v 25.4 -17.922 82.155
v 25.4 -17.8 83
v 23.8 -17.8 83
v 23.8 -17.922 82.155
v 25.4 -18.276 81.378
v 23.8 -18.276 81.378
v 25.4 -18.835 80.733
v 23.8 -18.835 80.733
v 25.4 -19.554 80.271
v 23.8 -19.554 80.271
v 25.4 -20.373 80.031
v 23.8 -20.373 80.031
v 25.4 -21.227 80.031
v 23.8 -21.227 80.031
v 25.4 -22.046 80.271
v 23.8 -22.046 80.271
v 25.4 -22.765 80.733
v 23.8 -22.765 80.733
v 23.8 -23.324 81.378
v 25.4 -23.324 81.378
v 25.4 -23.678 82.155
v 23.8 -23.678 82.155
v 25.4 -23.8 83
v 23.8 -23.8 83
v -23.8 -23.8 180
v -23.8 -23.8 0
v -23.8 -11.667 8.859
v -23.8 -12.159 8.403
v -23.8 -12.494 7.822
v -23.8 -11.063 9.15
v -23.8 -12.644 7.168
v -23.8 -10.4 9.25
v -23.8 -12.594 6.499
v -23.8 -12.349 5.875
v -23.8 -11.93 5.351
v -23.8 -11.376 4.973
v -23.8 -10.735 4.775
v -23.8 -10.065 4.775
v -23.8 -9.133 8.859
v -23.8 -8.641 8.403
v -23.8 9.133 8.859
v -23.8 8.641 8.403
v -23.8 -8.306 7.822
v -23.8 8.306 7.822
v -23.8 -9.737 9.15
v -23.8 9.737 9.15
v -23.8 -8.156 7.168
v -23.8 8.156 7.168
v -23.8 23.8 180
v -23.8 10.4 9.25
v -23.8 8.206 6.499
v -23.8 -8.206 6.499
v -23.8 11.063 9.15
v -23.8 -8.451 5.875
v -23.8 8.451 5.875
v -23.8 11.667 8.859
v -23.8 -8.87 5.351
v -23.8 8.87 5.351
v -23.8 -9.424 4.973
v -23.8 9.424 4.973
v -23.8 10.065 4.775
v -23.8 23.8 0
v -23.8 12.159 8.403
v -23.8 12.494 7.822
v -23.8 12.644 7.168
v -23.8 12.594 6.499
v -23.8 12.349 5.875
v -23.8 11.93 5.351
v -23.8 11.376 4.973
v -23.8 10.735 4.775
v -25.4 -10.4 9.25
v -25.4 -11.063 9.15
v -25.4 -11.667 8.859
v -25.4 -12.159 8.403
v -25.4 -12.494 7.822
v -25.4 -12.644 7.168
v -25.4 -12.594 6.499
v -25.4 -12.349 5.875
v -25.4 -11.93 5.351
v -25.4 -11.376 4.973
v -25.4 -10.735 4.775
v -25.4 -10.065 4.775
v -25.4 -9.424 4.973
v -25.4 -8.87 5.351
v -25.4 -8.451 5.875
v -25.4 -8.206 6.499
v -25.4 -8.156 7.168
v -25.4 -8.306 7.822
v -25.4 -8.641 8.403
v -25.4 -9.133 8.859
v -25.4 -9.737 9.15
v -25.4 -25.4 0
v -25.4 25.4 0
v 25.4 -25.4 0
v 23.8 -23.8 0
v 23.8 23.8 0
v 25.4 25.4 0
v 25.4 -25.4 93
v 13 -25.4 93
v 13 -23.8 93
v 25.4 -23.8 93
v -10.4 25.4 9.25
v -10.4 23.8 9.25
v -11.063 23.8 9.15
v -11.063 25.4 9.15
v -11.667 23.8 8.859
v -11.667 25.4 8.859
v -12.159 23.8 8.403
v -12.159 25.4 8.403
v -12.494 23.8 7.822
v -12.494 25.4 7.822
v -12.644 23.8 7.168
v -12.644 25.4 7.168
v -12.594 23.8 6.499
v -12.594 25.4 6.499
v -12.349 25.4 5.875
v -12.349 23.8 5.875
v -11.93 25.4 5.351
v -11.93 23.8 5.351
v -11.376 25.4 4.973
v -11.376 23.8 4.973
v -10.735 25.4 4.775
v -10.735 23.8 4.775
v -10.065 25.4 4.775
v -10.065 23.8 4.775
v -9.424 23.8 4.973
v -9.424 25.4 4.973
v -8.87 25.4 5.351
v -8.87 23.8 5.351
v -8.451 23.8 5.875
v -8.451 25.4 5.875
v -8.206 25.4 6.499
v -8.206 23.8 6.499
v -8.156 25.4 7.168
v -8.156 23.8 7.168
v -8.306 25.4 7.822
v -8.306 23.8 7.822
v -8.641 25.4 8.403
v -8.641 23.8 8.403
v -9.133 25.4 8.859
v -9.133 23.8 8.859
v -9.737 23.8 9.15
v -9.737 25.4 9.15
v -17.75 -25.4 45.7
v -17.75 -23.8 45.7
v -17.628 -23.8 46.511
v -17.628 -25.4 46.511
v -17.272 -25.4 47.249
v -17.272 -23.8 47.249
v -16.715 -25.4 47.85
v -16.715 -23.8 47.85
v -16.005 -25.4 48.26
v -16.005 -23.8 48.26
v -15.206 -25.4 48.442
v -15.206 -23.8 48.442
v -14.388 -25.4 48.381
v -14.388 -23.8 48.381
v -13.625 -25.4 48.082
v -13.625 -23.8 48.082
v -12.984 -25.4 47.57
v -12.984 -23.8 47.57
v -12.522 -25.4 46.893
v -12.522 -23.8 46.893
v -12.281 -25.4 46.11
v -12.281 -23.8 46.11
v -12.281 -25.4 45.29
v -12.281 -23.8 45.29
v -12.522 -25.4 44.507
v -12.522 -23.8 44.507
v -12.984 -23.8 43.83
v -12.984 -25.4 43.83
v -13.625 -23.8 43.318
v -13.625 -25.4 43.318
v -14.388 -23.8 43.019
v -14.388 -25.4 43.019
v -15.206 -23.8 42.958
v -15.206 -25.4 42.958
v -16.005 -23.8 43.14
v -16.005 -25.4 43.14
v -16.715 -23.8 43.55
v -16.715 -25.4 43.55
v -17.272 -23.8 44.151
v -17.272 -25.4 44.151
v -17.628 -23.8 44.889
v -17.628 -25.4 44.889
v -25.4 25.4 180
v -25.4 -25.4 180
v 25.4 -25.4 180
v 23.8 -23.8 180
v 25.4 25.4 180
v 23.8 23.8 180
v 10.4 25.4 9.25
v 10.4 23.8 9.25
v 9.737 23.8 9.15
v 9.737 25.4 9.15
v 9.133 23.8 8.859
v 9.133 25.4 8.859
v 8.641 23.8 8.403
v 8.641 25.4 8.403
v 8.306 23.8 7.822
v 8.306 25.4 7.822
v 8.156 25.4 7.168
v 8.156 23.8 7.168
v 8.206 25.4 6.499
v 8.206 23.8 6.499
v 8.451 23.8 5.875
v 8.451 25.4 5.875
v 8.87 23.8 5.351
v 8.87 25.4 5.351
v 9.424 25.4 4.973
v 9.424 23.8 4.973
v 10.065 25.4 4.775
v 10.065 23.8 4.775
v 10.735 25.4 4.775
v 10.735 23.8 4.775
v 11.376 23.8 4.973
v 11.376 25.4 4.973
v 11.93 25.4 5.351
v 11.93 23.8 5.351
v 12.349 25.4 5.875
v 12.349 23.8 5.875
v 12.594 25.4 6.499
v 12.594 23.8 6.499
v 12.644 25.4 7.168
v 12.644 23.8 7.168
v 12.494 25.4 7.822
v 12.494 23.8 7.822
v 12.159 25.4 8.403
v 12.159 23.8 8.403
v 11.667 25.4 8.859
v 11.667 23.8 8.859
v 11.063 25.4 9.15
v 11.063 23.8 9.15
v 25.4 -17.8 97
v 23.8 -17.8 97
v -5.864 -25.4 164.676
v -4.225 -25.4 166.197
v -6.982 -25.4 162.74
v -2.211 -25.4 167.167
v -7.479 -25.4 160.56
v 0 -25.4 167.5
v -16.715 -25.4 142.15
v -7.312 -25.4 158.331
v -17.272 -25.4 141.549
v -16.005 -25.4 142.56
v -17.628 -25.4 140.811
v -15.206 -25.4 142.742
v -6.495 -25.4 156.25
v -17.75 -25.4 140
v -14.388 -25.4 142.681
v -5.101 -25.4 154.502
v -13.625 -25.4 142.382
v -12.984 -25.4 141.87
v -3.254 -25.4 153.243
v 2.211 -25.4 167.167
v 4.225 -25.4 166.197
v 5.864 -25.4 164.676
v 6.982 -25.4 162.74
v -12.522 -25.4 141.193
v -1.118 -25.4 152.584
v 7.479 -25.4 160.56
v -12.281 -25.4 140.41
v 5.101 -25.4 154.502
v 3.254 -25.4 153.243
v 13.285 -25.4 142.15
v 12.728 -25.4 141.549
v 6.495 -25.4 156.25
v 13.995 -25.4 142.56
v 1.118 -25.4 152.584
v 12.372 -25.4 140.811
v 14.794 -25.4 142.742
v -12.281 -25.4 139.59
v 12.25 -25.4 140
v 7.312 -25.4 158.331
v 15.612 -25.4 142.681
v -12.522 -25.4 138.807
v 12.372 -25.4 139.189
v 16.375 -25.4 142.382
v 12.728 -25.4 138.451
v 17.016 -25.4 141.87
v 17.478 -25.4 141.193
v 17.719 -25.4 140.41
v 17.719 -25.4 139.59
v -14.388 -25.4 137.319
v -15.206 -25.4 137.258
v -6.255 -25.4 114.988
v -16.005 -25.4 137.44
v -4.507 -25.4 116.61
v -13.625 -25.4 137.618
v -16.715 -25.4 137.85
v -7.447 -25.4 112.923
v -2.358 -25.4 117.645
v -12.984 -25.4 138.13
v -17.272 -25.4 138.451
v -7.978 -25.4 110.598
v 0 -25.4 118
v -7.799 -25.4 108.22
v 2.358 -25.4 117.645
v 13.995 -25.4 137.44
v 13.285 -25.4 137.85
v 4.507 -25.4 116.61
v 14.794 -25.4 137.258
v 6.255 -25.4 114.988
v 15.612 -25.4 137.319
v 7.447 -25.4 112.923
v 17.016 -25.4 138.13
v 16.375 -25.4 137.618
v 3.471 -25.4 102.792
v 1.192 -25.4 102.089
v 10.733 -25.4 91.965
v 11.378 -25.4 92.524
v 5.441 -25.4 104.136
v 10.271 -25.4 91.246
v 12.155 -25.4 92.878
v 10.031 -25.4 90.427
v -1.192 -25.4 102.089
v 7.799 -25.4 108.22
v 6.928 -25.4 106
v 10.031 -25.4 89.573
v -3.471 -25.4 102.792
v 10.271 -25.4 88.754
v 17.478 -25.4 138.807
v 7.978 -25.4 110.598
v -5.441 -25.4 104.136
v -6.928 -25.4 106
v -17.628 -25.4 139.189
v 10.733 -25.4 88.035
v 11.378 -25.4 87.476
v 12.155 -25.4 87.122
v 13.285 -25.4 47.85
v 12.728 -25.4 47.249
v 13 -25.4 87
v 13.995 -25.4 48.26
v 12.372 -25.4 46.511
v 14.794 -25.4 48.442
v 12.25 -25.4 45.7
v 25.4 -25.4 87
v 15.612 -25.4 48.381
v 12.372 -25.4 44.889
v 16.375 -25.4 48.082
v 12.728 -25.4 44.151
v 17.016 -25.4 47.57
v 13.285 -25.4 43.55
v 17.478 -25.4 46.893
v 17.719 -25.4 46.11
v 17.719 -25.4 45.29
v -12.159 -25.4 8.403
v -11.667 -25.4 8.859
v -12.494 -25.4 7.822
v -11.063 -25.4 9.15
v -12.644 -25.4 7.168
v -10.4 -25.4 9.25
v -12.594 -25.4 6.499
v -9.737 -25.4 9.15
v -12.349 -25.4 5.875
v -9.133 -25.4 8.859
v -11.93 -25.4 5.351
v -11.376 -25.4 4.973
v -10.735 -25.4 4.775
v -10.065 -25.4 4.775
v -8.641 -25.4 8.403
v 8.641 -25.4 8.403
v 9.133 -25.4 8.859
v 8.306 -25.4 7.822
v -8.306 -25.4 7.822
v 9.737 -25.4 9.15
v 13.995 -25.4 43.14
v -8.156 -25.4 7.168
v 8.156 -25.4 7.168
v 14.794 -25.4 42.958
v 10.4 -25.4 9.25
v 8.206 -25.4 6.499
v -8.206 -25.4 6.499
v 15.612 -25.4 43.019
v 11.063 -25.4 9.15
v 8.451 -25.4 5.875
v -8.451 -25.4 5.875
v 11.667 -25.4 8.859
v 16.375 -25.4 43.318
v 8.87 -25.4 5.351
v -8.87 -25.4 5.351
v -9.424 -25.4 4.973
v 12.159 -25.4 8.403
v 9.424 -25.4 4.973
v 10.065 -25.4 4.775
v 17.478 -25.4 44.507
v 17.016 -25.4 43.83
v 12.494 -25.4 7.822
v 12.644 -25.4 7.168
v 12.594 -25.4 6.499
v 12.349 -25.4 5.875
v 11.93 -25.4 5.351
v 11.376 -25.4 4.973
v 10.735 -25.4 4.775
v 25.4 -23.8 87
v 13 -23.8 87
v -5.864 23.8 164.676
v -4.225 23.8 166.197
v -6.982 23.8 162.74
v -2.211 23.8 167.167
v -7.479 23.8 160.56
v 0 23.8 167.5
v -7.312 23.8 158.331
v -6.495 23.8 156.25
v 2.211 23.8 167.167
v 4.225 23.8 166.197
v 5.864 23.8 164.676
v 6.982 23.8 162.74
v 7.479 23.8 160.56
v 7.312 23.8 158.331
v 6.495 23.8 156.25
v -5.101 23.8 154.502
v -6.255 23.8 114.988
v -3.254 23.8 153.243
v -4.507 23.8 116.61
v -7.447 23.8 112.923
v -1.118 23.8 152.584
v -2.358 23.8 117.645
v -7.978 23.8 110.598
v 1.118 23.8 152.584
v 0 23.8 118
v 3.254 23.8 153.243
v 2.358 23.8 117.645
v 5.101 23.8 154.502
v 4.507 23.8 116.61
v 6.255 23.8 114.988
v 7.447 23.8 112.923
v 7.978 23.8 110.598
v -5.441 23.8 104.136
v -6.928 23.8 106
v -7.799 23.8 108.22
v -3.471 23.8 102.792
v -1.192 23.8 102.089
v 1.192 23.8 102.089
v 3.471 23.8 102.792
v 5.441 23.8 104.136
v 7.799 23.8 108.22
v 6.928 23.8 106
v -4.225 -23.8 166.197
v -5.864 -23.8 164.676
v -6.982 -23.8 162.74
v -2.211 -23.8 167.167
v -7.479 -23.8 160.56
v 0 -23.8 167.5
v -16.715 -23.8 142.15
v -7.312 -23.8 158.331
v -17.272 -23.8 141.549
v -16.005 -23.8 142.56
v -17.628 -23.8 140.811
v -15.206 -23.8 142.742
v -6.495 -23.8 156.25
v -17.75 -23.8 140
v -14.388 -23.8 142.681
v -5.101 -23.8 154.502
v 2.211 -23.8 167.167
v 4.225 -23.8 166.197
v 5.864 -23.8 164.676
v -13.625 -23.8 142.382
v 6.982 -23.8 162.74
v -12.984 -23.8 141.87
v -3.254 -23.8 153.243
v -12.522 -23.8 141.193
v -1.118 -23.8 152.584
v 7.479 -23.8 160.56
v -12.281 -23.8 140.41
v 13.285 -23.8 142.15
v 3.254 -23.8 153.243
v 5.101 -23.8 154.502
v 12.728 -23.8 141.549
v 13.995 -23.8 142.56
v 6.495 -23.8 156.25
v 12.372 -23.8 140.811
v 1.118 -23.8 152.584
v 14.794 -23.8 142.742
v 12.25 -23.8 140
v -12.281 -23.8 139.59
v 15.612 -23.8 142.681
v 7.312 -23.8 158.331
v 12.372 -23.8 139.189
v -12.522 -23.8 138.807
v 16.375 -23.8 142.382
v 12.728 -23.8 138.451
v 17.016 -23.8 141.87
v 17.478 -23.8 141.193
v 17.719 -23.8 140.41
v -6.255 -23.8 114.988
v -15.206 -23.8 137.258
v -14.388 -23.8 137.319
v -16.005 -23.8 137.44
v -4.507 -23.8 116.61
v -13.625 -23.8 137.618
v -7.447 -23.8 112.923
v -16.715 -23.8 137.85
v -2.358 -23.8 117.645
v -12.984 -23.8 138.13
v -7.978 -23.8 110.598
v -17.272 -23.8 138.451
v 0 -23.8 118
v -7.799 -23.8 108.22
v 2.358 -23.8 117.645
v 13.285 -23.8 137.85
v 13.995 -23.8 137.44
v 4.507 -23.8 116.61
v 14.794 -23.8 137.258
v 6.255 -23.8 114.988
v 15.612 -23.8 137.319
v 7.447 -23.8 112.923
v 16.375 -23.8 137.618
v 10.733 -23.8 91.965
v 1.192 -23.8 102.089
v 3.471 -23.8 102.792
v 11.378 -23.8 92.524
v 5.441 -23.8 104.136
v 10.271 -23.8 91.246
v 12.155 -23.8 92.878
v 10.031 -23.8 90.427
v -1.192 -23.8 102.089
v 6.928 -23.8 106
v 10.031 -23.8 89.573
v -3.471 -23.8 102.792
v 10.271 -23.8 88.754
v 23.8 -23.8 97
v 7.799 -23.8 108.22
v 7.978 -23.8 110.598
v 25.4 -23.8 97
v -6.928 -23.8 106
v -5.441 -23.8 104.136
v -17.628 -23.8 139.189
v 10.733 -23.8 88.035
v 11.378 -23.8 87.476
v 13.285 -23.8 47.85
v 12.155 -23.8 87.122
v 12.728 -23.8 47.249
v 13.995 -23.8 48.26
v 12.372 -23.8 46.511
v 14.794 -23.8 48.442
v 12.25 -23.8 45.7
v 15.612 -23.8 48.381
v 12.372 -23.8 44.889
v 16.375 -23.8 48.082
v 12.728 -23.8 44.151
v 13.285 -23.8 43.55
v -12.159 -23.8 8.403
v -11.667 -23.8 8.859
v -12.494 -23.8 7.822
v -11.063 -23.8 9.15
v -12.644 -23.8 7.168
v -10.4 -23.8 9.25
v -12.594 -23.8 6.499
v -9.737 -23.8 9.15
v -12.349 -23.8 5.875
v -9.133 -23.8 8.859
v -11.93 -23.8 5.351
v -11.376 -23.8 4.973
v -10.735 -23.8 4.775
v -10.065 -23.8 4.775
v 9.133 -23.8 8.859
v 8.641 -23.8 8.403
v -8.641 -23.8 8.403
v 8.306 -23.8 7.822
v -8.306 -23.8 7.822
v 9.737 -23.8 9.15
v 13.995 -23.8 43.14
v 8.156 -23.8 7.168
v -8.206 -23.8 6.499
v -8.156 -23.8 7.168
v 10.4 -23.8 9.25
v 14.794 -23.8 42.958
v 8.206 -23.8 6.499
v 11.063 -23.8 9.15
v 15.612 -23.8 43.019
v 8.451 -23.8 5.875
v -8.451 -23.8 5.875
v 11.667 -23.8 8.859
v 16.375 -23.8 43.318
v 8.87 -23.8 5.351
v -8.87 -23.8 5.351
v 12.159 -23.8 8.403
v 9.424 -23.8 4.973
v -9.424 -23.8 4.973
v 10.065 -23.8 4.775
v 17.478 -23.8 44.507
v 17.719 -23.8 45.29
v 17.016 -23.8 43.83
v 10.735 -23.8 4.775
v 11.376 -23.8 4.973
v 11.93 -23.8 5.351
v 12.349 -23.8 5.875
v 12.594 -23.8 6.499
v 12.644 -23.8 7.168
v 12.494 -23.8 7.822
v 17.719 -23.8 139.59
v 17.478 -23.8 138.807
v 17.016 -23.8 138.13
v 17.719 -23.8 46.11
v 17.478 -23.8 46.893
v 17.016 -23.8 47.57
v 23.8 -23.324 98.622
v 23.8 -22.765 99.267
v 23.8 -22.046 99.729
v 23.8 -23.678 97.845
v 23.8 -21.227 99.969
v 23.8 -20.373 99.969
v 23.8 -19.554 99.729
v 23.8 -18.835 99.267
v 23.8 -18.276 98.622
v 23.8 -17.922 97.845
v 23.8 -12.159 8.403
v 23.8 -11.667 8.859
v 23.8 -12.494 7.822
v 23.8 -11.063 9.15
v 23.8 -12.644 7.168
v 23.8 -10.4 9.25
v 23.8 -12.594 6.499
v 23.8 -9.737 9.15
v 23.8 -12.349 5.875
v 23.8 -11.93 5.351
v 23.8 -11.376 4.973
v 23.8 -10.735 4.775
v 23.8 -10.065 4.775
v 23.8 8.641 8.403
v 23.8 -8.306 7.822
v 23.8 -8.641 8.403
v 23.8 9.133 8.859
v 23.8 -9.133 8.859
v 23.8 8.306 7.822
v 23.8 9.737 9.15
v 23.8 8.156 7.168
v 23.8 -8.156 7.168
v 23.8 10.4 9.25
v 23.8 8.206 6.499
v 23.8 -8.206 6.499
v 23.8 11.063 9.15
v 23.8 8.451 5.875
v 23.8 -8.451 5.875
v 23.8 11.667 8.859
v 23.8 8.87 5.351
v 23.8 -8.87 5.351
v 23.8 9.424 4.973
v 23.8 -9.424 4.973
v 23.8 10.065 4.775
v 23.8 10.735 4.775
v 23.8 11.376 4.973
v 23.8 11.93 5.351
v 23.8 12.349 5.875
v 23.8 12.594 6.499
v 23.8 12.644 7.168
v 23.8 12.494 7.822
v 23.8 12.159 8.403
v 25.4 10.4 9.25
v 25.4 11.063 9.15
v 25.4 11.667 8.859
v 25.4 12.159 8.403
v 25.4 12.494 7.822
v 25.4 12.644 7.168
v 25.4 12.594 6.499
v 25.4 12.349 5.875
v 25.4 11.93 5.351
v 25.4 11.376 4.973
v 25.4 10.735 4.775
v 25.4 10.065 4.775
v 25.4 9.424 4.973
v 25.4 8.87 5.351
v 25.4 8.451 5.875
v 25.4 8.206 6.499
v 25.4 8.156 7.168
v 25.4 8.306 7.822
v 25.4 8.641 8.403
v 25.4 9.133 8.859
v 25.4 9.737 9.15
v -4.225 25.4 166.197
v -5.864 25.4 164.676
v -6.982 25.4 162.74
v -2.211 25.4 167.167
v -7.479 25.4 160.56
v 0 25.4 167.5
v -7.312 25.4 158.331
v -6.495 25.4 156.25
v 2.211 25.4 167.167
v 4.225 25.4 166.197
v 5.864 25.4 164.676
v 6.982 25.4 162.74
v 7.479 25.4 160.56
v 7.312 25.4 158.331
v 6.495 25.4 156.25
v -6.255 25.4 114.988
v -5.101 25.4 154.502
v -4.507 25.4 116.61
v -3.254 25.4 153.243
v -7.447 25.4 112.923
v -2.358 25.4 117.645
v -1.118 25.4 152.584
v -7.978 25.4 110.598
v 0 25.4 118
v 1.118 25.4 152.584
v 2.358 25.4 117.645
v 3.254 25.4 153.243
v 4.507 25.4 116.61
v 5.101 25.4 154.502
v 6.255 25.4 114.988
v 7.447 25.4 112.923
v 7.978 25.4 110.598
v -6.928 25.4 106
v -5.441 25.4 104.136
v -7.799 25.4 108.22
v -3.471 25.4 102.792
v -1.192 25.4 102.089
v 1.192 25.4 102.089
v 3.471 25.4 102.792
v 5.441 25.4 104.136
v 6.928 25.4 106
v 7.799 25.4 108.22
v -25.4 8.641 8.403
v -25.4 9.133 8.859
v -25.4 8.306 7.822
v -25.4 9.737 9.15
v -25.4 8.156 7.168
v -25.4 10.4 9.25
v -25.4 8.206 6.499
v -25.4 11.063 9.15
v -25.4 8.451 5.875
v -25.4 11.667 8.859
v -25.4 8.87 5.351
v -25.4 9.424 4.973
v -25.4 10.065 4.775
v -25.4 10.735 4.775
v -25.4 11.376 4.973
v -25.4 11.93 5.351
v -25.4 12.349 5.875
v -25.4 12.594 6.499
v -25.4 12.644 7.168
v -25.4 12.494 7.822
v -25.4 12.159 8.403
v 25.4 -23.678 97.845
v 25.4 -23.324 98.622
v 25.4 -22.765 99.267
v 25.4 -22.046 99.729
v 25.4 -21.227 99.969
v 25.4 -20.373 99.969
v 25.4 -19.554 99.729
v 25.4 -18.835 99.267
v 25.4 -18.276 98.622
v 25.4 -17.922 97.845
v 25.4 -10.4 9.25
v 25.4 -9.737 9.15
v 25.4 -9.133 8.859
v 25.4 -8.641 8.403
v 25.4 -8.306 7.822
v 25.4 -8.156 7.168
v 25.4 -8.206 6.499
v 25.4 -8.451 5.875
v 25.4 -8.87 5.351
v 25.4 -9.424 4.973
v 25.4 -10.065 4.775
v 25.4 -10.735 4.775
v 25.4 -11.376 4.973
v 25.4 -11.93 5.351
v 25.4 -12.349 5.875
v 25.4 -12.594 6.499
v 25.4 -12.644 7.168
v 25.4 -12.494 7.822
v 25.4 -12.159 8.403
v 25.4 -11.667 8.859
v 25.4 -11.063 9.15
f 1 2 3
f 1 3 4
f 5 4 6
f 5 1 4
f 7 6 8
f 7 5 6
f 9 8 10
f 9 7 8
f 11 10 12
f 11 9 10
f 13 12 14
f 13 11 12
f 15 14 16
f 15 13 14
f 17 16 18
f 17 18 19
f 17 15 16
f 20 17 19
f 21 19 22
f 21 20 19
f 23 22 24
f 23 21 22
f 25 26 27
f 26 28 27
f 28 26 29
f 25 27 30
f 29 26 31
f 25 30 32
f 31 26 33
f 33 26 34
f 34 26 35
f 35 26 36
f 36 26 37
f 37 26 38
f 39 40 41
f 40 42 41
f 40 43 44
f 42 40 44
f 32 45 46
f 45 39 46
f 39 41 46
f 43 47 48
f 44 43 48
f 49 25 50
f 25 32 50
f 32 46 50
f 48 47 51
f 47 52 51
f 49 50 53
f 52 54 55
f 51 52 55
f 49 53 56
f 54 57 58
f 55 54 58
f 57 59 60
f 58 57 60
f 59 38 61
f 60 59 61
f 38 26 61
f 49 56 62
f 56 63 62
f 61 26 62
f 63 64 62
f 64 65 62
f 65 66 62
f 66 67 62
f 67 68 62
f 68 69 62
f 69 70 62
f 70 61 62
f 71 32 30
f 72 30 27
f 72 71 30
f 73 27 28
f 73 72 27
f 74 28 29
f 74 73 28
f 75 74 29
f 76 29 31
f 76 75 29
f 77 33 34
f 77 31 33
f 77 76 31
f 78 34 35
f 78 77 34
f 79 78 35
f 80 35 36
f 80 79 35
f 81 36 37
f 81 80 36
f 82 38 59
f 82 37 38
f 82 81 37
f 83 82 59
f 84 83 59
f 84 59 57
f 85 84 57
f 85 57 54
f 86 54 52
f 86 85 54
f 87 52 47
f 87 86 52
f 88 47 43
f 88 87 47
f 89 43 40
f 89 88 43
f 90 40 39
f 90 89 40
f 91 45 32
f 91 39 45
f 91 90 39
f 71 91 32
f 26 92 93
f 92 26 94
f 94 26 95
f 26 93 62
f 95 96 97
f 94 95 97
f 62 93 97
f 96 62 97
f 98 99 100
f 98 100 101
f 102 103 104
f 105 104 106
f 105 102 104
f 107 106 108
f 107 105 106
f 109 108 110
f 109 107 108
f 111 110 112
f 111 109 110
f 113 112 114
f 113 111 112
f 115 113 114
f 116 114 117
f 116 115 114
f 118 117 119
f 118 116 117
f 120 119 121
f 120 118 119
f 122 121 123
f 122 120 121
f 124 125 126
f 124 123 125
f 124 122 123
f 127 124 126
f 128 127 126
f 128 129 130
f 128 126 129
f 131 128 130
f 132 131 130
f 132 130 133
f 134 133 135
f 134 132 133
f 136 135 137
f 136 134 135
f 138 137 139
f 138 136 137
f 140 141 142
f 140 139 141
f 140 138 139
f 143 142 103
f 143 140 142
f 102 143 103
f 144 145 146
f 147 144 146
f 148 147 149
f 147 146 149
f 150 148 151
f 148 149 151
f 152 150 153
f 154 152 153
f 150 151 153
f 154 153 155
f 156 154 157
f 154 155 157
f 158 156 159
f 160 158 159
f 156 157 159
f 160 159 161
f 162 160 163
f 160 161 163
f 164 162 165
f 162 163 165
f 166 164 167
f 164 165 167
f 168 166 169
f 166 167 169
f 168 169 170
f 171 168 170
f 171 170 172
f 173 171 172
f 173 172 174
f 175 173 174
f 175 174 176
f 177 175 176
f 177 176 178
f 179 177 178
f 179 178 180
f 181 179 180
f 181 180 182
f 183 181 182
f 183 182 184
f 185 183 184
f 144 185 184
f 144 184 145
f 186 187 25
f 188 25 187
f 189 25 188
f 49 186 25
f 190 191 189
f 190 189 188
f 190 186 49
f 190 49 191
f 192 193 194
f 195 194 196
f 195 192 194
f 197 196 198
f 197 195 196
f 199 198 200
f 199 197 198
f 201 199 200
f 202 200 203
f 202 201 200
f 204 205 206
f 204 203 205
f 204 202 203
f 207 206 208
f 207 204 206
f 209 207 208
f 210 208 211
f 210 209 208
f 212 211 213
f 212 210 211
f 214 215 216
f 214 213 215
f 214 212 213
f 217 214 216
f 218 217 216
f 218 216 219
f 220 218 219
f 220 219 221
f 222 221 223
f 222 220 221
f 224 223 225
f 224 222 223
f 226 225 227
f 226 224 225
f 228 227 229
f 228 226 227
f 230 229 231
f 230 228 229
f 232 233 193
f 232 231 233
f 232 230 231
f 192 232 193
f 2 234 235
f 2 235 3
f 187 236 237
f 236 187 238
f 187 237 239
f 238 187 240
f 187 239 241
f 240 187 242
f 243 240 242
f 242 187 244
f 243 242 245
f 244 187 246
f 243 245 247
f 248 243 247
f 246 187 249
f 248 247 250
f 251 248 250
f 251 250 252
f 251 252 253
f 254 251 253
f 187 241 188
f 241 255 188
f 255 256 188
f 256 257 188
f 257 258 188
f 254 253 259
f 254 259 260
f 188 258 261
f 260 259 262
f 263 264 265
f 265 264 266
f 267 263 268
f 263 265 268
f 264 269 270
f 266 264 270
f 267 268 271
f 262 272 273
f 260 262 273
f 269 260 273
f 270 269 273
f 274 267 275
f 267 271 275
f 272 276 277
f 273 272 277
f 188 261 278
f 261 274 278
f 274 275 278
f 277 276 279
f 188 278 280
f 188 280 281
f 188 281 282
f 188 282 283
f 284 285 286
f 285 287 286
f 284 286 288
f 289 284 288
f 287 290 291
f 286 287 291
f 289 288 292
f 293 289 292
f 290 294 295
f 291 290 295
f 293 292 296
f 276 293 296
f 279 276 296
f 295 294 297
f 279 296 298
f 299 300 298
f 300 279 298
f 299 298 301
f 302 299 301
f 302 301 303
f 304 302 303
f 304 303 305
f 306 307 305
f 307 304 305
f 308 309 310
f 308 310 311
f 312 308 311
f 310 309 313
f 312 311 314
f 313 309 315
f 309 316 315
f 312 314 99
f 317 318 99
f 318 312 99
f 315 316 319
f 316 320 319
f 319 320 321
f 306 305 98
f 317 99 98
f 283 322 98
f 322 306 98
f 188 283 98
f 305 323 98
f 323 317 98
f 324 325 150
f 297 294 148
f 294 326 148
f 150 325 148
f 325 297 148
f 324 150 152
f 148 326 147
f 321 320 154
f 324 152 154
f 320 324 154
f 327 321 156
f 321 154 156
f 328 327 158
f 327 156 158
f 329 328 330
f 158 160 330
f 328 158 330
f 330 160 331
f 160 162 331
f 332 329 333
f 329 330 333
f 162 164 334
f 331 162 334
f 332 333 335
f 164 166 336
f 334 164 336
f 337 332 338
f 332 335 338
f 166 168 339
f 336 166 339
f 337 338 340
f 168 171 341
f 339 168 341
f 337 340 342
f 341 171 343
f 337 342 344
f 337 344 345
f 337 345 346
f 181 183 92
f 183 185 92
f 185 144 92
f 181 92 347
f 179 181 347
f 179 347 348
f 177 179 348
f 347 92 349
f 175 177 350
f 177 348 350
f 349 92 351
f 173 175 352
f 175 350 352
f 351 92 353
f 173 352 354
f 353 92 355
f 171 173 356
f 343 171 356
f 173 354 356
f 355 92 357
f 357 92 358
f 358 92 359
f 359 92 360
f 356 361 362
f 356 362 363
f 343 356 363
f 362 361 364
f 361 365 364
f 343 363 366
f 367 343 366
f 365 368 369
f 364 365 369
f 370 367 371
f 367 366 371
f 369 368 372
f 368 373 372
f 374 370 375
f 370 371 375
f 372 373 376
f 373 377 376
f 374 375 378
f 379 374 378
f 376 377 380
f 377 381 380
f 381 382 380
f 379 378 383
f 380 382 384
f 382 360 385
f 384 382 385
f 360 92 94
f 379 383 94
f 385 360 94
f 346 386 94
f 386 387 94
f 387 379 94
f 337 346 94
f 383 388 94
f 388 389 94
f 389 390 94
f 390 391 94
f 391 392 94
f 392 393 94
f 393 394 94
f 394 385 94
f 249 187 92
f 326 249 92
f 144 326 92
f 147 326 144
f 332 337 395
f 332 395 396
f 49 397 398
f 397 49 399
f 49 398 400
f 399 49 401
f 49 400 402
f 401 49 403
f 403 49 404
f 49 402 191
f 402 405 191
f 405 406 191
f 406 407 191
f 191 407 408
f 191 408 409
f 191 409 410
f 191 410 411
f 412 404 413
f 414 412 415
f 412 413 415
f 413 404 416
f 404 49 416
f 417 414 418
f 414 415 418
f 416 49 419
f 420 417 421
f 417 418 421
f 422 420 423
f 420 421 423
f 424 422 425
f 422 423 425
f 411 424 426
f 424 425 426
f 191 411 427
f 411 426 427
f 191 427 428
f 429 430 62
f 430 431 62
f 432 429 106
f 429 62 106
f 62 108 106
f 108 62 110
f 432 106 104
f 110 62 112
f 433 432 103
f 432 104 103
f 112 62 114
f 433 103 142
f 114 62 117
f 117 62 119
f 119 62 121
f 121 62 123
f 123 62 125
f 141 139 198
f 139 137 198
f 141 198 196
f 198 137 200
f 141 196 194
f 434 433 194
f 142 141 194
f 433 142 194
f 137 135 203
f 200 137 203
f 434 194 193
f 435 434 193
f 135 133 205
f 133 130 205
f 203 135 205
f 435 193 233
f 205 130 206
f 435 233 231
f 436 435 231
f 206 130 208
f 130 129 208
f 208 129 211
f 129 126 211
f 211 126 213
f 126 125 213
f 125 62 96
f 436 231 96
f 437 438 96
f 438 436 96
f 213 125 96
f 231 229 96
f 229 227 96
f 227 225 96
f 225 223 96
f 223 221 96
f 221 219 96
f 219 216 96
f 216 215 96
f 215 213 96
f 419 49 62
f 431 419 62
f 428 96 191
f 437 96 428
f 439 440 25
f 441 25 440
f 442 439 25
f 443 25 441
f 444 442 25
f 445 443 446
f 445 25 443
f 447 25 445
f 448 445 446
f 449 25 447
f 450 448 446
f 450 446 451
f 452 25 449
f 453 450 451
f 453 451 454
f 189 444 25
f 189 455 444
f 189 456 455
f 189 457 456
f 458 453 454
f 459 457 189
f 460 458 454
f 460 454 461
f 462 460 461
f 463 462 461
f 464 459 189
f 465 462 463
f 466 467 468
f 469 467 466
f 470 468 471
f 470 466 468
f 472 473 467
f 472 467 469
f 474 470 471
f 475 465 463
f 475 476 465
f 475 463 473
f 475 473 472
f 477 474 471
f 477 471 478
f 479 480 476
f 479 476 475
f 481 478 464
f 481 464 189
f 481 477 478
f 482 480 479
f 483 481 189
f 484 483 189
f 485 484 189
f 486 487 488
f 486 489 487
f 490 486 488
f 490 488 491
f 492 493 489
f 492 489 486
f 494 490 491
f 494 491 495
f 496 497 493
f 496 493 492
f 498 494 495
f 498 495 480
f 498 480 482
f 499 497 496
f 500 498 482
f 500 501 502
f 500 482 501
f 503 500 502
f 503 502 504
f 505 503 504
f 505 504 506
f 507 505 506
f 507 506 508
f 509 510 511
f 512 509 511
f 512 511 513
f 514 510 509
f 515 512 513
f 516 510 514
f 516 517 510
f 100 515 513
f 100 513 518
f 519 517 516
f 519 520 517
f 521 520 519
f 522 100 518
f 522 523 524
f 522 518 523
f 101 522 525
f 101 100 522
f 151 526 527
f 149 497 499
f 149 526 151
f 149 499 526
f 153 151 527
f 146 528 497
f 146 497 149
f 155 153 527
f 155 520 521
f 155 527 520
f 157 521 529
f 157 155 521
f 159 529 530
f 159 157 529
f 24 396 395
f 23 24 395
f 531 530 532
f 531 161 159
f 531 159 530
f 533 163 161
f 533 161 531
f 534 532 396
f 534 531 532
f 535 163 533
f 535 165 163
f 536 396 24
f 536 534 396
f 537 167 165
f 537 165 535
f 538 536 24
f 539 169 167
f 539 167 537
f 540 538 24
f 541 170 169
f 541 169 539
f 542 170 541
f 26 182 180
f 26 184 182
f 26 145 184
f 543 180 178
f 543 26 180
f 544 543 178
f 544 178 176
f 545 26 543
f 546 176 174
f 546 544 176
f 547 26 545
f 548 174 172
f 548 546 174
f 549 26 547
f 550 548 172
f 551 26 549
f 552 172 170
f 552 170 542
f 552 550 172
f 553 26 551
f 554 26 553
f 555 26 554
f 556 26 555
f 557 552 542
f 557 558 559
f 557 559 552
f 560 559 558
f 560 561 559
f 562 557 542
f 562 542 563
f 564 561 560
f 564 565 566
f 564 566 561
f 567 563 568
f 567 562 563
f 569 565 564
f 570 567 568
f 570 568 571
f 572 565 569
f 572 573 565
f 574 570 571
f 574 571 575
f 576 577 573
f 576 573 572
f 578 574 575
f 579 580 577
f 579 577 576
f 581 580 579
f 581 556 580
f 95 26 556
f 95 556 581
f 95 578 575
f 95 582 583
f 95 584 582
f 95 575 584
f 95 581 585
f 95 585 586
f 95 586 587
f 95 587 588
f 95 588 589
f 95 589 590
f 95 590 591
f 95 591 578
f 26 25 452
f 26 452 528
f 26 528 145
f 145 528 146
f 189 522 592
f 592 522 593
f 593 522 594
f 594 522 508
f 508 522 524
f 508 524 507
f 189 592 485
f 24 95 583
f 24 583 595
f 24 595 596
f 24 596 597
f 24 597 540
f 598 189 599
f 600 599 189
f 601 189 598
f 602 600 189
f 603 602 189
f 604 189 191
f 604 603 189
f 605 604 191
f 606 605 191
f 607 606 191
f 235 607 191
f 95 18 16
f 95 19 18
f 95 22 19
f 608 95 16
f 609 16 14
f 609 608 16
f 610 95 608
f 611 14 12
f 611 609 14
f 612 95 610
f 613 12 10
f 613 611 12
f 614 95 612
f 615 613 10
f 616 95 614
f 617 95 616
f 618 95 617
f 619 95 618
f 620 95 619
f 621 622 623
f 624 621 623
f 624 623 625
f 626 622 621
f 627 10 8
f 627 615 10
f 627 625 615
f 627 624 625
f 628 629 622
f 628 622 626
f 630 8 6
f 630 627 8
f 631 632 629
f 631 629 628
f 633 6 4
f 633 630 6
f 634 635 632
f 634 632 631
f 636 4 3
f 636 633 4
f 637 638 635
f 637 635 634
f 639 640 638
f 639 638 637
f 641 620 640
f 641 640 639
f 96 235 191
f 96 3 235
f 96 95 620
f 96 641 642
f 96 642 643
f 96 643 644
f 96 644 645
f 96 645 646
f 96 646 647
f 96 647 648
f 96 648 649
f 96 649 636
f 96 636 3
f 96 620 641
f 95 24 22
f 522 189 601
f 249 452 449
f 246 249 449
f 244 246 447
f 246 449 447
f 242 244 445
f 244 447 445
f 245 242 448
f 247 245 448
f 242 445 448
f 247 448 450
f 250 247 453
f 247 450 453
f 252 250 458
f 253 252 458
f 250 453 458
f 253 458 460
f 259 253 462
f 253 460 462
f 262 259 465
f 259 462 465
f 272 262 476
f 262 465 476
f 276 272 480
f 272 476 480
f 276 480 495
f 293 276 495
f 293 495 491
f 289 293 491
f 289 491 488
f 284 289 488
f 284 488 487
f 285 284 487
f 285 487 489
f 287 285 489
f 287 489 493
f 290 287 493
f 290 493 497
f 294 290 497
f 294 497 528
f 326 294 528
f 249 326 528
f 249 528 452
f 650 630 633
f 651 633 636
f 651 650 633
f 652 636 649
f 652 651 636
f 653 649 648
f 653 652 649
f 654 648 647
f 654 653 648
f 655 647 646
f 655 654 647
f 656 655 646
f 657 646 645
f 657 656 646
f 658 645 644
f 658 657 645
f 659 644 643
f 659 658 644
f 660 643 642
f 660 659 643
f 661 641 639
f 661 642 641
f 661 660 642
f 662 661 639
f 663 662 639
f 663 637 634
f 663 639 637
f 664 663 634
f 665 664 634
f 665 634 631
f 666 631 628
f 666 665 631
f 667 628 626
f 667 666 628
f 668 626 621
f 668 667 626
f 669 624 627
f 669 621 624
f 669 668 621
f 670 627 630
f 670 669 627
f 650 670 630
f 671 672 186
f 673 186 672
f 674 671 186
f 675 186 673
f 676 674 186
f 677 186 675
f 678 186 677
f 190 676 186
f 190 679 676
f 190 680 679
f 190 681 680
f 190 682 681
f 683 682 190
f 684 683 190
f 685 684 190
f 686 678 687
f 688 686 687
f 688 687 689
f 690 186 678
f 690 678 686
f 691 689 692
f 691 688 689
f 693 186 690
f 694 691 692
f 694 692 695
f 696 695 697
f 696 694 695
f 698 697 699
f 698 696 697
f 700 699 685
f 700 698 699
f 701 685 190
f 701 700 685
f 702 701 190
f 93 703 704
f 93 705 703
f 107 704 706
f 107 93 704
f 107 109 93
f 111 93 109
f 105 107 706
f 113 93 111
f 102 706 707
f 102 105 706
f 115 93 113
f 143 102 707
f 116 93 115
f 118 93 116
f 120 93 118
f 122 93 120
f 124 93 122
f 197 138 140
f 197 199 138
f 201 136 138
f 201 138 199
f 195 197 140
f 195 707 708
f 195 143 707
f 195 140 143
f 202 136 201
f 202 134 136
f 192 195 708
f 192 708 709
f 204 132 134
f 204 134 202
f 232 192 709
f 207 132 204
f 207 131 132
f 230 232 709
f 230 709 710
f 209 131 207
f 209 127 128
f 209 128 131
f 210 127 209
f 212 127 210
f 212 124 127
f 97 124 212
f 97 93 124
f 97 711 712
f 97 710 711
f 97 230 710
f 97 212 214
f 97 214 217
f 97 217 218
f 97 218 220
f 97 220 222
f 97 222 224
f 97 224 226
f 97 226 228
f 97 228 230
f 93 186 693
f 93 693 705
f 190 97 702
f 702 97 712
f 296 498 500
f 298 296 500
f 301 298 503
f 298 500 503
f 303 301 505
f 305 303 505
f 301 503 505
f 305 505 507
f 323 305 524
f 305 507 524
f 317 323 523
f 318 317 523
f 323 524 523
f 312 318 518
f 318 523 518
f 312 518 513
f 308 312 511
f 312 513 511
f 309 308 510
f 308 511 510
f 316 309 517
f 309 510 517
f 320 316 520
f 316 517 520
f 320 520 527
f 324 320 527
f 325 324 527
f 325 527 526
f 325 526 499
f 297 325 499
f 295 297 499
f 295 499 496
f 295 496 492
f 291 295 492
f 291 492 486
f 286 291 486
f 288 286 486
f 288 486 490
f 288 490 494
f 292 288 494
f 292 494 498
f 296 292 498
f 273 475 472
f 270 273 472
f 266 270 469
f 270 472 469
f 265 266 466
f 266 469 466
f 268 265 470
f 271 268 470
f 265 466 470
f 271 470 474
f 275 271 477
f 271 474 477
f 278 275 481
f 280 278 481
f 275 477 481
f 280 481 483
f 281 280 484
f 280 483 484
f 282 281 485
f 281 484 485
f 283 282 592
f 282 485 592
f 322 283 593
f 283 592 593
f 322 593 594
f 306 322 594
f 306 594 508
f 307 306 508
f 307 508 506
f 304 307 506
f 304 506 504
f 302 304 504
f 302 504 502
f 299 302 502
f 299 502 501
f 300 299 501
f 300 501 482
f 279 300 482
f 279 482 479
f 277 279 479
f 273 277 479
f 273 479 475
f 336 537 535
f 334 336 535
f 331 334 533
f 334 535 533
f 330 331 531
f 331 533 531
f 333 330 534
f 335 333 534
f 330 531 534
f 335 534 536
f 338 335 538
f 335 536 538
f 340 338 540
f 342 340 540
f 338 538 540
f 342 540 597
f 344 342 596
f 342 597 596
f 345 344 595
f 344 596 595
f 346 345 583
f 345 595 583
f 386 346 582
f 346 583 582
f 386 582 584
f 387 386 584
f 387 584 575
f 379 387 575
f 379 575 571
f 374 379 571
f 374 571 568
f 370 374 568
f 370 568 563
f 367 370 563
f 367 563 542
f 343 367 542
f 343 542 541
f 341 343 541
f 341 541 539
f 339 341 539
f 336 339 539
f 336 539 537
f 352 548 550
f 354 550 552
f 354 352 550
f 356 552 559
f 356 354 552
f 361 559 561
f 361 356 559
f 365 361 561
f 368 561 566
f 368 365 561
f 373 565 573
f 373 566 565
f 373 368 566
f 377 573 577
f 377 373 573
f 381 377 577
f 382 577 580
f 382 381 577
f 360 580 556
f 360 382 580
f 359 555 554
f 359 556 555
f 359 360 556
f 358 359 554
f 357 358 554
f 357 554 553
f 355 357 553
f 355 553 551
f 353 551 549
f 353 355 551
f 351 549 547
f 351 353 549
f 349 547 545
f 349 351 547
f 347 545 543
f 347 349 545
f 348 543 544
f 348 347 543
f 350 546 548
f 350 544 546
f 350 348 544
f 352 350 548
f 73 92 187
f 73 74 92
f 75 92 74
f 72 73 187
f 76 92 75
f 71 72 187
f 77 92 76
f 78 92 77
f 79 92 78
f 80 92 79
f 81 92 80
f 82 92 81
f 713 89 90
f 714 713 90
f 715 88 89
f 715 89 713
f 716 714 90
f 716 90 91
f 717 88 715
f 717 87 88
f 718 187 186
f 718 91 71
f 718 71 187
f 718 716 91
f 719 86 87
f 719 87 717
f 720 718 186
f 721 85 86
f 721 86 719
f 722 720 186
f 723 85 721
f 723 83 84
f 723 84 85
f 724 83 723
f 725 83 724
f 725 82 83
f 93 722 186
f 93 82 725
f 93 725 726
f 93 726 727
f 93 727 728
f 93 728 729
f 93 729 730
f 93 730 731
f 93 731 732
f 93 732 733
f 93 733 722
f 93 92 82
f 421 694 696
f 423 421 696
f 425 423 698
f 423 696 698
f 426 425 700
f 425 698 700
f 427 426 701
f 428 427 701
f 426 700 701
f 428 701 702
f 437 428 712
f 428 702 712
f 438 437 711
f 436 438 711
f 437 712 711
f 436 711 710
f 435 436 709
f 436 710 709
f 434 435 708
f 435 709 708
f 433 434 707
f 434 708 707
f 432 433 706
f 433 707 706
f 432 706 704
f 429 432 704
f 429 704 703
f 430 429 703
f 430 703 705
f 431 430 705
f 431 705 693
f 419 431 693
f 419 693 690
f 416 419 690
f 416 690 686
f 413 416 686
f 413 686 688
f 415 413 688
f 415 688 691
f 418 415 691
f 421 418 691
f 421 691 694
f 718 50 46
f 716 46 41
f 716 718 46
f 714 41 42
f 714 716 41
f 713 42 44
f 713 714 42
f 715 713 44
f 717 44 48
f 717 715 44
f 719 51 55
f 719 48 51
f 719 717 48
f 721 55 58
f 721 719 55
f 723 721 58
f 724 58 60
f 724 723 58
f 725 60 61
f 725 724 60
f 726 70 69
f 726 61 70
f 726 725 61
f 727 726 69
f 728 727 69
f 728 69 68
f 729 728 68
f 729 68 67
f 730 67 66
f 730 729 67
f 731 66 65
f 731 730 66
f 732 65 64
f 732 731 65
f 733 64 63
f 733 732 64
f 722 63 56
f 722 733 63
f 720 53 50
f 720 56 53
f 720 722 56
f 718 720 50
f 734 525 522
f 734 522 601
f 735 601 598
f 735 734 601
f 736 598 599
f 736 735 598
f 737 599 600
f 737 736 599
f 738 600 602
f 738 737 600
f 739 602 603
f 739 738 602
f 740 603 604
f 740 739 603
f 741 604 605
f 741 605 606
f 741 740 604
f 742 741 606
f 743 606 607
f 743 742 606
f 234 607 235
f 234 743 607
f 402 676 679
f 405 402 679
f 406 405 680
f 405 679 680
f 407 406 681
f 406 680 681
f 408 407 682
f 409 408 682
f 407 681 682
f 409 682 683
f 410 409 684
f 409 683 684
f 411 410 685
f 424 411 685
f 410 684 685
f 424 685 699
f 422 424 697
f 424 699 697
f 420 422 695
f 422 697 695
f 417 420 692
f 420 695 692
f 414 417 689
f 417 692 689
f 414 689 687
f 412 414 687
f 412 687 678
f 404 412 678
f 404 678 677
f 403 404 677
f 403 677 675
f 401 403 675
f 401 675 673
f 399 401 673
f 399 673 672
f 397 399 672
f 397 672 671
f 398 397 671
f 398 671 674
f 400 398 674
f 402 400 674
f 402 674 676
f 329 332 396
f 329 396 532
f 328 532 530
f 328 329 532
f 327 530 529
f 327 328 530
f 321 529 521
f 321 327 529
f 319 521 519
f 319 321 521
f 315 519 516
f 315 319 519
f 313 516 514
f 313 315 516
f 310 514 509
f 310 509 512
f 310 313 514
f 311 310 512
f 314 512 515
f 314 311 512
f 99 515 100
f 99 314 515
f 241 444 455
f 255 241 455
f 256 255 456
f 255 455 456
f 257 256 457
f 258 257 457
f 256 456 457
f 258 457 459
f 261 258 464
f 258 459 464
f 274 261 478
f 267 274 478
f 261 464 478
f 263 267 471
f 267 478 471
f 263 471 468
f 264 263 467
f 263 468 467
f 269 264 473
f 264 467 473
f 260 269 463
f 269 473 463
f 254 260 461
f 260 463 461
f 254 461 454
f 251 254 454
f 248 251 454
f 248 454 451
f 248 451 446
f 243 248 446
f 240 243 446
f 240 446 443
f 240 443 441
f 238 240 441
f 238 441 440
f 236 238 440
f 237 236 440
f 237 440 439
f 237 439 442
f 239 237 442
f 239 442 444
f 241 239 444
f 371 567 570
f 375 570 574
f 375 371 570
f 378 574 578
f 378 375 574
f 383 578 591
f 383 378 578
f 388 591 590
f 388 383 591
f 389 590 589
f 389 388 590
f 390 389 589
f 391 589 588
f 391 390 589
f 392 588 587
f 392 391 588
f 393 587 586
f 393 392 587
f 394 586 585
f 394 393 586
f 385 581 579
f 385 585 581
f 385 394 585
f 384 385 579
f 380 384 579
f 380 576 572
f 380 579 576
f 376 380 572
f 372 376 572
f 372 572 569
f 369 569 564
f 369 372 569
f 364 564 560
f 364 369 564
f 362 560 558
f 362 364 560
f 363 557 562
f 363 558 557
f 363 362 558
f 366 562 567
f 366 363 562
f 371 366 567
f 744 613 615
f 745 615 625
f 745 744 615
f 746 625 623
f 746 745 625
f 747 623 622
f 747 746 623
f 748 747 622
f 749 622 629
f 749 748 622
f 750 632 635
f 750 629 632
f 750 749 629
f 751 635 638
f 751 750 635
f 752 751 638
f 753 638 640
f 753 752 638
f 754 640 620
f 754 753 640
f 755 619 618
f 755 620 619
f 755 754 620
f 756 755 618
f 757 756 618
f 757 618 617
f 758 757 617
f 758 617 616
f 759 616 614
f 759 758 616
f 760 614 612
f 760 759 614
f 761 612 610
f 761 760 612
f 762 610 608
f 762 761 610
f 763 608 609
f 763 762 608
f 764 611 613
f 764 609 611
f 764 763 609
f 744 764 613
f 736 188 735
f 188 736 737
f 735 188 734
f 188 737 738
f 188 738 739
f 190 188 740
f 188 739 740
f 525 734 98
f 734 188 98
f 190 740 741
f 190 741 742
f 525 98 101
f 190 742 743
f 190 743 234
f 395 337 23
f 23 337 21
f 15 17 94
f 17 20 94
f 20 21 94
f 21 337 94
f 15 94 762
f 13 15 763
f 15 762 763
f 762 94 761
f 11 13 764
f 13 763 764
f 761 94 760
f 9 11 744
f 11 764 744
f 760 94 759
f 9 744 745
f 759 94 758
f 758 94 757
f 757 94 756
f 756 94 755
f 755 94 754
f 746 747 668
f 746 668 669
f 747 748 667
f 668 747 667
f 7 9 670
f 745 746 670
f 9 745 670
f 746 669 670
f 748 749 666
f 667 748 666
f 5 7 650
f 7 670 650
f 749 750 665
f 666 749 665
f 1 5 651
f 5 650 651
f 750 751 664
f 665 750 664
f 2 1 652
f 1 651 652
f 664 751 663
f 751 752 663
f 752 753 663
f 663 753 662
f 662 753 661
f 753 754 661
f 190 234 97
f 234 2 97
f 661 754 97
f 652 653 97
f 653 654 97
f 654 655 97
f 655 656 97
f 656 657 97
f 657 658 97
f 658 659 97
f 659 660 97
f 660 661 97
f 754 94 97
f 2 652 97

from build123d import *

# Parameters (mm, degrees)
SKETCH1_W                     = 50.8
SKETCH1_H                     = 50.8
SKETCH1_W_2                   = 47.6
SKETCH1_H_2                   = 47.6
BOSS_EXTRUDE1_DEPTH           = 180
SKETCH6_R                     = 7.5
SKETCH6_R_2                   = 8
CUT_EXTRUDE1_DEPTH            = 189.747980122
M4_CLEARANCE_HOLE1_AT_2_COUNT = 2
M4_CLEARANCE_HOLE1_AT_2_PITCH = 20.8
CIRPATTERN1_COUNT             = 4
M5_CLEARANCE_HOLE1_D          = 5.5
M5_CLEARANCE_HOLE1_DEPTH      = 19.75
M5_CLEARANCE_HOLE1_TIP        = 1.652366702
CUT_EXTRUDE2_DEPTH            = 1.6
CUT_EXTRUDE3_DEPTH            = 1.6


with BuildPart() as part:
    # Sketch1 → Boss-Extrude1 (new body)
    with BuildSketch(Plane.XY):
        Rectangle(SKETCH1_W, SKETCH1_H)
        Rectangle(SKETCH1_W_2, SKETCH1_H_2, mode=Mode.SUBTRACT)
    extrude(amount=BOSS_EXTRUDE1_DEPTH)

    # Sketch6 → Cut-Extrude1 (cut, through all)
    with BuildSketch(Plane(origin=(0, 25.4, 0), x_dir=(1, 0, 0), z_dir=(0, 1, 0))):
        with Locations(Location((0, -160, 0), (0, 0, 270))):
            Circle(SKETCH6_R)
        with Locations(Location((0, -110, 0), (0, 0, 270))):
            Circle(SKETCH6_R_2)
    extrude(amount=-CUT_EXTRUDE1_DEPTH, mode=Mode.SUBTRACT)

    # Sketch8 → M4 Clearance Hole1 (revolve, cut)
    with BuildSketch(Plane(origin=(-25.4, -10.4, 7), x_dir=(0, 0, 1), z_dir=(0, 1, 0))):
        Polygon((0, 0), (0, 12.851936393), (2.25, 11.5), (2.25, 0), align=None)
    m4_clearance_hole1 = revolve(axis=Axis((-31.75, -10.4, 7), (1, 0, 0)), mode=Mode.SUBTRACT)

    # M4 Clearance Hole1 at 2: M4 Clearance Hole1 ×2
    with Locations(*[(0, i * M4_CLEARANCE_HOLE1_AT_2_PITCH, 0) for i in range(1, M4_CLEARANCE_HOLE1_AT_2_COUNT)]):
        add(m4_clearance_hole1, mode=Mode.SUBTRACT)

    # CirPattern1: M4 Clearance Hole1 ×4 about axis
    cirpattern1_axis = Axis((0, 0, 0), (0, 0, 1))
    for i in range(1, CIRPATTERN1_COUNT):
        add(m4_clearance_hole1.rotate(cirpattern1_axis, i * 360 / CIRPATTERN1_COUNT), mode=Mode.SUBTRACT)

    # CirPattern1 copy 1 sketch → CirPattern1 copy 1 (revolve, cut)
    with BuildSketch(Plane(origin=(-10.4, -25.4, 7), x_dir=(0, 0, 1), z_dir=(-1, 0, 0))):
        Polygon((0, 0), (0, 12.851936393), (2.25, 11.5), (2.25, 0), align=None)
    revolve(axis=Axis((-10.4, -31.75, 7), (0, 1, 0)), mode=Mode.SUBTRACT)

    # CirPattern1 copy 2 sketch → CirPattern1 copy 2 (revolve, cut)
    with BuildSketch(Plane(origin=(25.4, -10.4, 7), x_dir=(0, 0, 1), z_dir=(0, -1, 0))):
        Polygon((0, 0), (0, 12.851936393), (2.25, 11.5), (2.25, 0), align=None)
    revolve(axis=Axis((31.75, -10.4, 7), (-1, 0, 0)), mode=Mode.SUBTRACT)

    # CirPattern1 copy 3 sketch → CirPattern1 copy 3 (revolve, cut)
    with BuildSketch(Plane(origin=(10.4, 25.4, 7), x_dir=(0, 0, 1), z_dir=(1, 0, 0))):
        Polygon((0, 0), (0, 12.851936393), (2.25, 11.5), (2.25, 0), align=None)
    revolve(axis=Axis((10.4, 31.75, 7), (0, -1, 0)), mode=Mode.SUBTRACT)

    # M5 Clearance Hole1
    with Locations(Plane.XZ.offset(25.4)):
        with Locations((15, 140), (-15, 140), (-15, 45.7), (15, 45.7)):
            Hole(M5_CLEARANCE_HOLE1_D / 2, depth=M5_CLEARANCE_HOLE1_DEPTH)
            with Locations((0, 0, -(M5_CLEARANCE_HOLE1_DEPTH + M5_CLEARANCE_HOLE1_TIP / 2))):  # 118° drill point
                Cone(0, M5_CLEARANCE_HOLE1_D / 2, M5_CLEARANCE_HOLE1_TIP, mode=Mode.SUBTRACT)

    # Sketch13 → Cut-Extrude2 (cut)
    with BuildSketch(Plane(origin=(0, -25.4, 0), x_dir=(-1, 0, 0), z_dir=(0, -1, 0))):
        with BuildLine():
            Line((-13, -93), (-25.4, -93))
            ThreePointArc((-25.4, -93), (-28.4, -90), (-25.4, -87))
            Line((-25.4, -87), (-13, -87))
            ThreePointArc((-13, -87), (-10, -90), (-13, -93))
        make_face()
    extrude(amount=-CUT_EXTRUDE2_DEPTH, mode=Mode.SUBTRACT)

    # Sketch14 → Cut-Extrude3 (cut)
    with BuildSketch(Plane(origin=(25.4, 0, 0), x_dir=(0, 0, -1), z_dir=(1, 0, 0))):
        with BuildLine():
            Line((-97, -17.8), (-83, -17.8))
            ThreePointArc((-83, -17.8), (-80, -20.8), (-83, -23.8))
            Line((-83, -23.8), (-97, -23.8))
            ThreePointArc((-97, -23.8), (-100, -20.8), (-97, -17.8))
        make_face()
    extrude(amount=-CUT_EXTRUDE3_DEPTH, mode=Mode.SUBTRACT)


solid = part.part
